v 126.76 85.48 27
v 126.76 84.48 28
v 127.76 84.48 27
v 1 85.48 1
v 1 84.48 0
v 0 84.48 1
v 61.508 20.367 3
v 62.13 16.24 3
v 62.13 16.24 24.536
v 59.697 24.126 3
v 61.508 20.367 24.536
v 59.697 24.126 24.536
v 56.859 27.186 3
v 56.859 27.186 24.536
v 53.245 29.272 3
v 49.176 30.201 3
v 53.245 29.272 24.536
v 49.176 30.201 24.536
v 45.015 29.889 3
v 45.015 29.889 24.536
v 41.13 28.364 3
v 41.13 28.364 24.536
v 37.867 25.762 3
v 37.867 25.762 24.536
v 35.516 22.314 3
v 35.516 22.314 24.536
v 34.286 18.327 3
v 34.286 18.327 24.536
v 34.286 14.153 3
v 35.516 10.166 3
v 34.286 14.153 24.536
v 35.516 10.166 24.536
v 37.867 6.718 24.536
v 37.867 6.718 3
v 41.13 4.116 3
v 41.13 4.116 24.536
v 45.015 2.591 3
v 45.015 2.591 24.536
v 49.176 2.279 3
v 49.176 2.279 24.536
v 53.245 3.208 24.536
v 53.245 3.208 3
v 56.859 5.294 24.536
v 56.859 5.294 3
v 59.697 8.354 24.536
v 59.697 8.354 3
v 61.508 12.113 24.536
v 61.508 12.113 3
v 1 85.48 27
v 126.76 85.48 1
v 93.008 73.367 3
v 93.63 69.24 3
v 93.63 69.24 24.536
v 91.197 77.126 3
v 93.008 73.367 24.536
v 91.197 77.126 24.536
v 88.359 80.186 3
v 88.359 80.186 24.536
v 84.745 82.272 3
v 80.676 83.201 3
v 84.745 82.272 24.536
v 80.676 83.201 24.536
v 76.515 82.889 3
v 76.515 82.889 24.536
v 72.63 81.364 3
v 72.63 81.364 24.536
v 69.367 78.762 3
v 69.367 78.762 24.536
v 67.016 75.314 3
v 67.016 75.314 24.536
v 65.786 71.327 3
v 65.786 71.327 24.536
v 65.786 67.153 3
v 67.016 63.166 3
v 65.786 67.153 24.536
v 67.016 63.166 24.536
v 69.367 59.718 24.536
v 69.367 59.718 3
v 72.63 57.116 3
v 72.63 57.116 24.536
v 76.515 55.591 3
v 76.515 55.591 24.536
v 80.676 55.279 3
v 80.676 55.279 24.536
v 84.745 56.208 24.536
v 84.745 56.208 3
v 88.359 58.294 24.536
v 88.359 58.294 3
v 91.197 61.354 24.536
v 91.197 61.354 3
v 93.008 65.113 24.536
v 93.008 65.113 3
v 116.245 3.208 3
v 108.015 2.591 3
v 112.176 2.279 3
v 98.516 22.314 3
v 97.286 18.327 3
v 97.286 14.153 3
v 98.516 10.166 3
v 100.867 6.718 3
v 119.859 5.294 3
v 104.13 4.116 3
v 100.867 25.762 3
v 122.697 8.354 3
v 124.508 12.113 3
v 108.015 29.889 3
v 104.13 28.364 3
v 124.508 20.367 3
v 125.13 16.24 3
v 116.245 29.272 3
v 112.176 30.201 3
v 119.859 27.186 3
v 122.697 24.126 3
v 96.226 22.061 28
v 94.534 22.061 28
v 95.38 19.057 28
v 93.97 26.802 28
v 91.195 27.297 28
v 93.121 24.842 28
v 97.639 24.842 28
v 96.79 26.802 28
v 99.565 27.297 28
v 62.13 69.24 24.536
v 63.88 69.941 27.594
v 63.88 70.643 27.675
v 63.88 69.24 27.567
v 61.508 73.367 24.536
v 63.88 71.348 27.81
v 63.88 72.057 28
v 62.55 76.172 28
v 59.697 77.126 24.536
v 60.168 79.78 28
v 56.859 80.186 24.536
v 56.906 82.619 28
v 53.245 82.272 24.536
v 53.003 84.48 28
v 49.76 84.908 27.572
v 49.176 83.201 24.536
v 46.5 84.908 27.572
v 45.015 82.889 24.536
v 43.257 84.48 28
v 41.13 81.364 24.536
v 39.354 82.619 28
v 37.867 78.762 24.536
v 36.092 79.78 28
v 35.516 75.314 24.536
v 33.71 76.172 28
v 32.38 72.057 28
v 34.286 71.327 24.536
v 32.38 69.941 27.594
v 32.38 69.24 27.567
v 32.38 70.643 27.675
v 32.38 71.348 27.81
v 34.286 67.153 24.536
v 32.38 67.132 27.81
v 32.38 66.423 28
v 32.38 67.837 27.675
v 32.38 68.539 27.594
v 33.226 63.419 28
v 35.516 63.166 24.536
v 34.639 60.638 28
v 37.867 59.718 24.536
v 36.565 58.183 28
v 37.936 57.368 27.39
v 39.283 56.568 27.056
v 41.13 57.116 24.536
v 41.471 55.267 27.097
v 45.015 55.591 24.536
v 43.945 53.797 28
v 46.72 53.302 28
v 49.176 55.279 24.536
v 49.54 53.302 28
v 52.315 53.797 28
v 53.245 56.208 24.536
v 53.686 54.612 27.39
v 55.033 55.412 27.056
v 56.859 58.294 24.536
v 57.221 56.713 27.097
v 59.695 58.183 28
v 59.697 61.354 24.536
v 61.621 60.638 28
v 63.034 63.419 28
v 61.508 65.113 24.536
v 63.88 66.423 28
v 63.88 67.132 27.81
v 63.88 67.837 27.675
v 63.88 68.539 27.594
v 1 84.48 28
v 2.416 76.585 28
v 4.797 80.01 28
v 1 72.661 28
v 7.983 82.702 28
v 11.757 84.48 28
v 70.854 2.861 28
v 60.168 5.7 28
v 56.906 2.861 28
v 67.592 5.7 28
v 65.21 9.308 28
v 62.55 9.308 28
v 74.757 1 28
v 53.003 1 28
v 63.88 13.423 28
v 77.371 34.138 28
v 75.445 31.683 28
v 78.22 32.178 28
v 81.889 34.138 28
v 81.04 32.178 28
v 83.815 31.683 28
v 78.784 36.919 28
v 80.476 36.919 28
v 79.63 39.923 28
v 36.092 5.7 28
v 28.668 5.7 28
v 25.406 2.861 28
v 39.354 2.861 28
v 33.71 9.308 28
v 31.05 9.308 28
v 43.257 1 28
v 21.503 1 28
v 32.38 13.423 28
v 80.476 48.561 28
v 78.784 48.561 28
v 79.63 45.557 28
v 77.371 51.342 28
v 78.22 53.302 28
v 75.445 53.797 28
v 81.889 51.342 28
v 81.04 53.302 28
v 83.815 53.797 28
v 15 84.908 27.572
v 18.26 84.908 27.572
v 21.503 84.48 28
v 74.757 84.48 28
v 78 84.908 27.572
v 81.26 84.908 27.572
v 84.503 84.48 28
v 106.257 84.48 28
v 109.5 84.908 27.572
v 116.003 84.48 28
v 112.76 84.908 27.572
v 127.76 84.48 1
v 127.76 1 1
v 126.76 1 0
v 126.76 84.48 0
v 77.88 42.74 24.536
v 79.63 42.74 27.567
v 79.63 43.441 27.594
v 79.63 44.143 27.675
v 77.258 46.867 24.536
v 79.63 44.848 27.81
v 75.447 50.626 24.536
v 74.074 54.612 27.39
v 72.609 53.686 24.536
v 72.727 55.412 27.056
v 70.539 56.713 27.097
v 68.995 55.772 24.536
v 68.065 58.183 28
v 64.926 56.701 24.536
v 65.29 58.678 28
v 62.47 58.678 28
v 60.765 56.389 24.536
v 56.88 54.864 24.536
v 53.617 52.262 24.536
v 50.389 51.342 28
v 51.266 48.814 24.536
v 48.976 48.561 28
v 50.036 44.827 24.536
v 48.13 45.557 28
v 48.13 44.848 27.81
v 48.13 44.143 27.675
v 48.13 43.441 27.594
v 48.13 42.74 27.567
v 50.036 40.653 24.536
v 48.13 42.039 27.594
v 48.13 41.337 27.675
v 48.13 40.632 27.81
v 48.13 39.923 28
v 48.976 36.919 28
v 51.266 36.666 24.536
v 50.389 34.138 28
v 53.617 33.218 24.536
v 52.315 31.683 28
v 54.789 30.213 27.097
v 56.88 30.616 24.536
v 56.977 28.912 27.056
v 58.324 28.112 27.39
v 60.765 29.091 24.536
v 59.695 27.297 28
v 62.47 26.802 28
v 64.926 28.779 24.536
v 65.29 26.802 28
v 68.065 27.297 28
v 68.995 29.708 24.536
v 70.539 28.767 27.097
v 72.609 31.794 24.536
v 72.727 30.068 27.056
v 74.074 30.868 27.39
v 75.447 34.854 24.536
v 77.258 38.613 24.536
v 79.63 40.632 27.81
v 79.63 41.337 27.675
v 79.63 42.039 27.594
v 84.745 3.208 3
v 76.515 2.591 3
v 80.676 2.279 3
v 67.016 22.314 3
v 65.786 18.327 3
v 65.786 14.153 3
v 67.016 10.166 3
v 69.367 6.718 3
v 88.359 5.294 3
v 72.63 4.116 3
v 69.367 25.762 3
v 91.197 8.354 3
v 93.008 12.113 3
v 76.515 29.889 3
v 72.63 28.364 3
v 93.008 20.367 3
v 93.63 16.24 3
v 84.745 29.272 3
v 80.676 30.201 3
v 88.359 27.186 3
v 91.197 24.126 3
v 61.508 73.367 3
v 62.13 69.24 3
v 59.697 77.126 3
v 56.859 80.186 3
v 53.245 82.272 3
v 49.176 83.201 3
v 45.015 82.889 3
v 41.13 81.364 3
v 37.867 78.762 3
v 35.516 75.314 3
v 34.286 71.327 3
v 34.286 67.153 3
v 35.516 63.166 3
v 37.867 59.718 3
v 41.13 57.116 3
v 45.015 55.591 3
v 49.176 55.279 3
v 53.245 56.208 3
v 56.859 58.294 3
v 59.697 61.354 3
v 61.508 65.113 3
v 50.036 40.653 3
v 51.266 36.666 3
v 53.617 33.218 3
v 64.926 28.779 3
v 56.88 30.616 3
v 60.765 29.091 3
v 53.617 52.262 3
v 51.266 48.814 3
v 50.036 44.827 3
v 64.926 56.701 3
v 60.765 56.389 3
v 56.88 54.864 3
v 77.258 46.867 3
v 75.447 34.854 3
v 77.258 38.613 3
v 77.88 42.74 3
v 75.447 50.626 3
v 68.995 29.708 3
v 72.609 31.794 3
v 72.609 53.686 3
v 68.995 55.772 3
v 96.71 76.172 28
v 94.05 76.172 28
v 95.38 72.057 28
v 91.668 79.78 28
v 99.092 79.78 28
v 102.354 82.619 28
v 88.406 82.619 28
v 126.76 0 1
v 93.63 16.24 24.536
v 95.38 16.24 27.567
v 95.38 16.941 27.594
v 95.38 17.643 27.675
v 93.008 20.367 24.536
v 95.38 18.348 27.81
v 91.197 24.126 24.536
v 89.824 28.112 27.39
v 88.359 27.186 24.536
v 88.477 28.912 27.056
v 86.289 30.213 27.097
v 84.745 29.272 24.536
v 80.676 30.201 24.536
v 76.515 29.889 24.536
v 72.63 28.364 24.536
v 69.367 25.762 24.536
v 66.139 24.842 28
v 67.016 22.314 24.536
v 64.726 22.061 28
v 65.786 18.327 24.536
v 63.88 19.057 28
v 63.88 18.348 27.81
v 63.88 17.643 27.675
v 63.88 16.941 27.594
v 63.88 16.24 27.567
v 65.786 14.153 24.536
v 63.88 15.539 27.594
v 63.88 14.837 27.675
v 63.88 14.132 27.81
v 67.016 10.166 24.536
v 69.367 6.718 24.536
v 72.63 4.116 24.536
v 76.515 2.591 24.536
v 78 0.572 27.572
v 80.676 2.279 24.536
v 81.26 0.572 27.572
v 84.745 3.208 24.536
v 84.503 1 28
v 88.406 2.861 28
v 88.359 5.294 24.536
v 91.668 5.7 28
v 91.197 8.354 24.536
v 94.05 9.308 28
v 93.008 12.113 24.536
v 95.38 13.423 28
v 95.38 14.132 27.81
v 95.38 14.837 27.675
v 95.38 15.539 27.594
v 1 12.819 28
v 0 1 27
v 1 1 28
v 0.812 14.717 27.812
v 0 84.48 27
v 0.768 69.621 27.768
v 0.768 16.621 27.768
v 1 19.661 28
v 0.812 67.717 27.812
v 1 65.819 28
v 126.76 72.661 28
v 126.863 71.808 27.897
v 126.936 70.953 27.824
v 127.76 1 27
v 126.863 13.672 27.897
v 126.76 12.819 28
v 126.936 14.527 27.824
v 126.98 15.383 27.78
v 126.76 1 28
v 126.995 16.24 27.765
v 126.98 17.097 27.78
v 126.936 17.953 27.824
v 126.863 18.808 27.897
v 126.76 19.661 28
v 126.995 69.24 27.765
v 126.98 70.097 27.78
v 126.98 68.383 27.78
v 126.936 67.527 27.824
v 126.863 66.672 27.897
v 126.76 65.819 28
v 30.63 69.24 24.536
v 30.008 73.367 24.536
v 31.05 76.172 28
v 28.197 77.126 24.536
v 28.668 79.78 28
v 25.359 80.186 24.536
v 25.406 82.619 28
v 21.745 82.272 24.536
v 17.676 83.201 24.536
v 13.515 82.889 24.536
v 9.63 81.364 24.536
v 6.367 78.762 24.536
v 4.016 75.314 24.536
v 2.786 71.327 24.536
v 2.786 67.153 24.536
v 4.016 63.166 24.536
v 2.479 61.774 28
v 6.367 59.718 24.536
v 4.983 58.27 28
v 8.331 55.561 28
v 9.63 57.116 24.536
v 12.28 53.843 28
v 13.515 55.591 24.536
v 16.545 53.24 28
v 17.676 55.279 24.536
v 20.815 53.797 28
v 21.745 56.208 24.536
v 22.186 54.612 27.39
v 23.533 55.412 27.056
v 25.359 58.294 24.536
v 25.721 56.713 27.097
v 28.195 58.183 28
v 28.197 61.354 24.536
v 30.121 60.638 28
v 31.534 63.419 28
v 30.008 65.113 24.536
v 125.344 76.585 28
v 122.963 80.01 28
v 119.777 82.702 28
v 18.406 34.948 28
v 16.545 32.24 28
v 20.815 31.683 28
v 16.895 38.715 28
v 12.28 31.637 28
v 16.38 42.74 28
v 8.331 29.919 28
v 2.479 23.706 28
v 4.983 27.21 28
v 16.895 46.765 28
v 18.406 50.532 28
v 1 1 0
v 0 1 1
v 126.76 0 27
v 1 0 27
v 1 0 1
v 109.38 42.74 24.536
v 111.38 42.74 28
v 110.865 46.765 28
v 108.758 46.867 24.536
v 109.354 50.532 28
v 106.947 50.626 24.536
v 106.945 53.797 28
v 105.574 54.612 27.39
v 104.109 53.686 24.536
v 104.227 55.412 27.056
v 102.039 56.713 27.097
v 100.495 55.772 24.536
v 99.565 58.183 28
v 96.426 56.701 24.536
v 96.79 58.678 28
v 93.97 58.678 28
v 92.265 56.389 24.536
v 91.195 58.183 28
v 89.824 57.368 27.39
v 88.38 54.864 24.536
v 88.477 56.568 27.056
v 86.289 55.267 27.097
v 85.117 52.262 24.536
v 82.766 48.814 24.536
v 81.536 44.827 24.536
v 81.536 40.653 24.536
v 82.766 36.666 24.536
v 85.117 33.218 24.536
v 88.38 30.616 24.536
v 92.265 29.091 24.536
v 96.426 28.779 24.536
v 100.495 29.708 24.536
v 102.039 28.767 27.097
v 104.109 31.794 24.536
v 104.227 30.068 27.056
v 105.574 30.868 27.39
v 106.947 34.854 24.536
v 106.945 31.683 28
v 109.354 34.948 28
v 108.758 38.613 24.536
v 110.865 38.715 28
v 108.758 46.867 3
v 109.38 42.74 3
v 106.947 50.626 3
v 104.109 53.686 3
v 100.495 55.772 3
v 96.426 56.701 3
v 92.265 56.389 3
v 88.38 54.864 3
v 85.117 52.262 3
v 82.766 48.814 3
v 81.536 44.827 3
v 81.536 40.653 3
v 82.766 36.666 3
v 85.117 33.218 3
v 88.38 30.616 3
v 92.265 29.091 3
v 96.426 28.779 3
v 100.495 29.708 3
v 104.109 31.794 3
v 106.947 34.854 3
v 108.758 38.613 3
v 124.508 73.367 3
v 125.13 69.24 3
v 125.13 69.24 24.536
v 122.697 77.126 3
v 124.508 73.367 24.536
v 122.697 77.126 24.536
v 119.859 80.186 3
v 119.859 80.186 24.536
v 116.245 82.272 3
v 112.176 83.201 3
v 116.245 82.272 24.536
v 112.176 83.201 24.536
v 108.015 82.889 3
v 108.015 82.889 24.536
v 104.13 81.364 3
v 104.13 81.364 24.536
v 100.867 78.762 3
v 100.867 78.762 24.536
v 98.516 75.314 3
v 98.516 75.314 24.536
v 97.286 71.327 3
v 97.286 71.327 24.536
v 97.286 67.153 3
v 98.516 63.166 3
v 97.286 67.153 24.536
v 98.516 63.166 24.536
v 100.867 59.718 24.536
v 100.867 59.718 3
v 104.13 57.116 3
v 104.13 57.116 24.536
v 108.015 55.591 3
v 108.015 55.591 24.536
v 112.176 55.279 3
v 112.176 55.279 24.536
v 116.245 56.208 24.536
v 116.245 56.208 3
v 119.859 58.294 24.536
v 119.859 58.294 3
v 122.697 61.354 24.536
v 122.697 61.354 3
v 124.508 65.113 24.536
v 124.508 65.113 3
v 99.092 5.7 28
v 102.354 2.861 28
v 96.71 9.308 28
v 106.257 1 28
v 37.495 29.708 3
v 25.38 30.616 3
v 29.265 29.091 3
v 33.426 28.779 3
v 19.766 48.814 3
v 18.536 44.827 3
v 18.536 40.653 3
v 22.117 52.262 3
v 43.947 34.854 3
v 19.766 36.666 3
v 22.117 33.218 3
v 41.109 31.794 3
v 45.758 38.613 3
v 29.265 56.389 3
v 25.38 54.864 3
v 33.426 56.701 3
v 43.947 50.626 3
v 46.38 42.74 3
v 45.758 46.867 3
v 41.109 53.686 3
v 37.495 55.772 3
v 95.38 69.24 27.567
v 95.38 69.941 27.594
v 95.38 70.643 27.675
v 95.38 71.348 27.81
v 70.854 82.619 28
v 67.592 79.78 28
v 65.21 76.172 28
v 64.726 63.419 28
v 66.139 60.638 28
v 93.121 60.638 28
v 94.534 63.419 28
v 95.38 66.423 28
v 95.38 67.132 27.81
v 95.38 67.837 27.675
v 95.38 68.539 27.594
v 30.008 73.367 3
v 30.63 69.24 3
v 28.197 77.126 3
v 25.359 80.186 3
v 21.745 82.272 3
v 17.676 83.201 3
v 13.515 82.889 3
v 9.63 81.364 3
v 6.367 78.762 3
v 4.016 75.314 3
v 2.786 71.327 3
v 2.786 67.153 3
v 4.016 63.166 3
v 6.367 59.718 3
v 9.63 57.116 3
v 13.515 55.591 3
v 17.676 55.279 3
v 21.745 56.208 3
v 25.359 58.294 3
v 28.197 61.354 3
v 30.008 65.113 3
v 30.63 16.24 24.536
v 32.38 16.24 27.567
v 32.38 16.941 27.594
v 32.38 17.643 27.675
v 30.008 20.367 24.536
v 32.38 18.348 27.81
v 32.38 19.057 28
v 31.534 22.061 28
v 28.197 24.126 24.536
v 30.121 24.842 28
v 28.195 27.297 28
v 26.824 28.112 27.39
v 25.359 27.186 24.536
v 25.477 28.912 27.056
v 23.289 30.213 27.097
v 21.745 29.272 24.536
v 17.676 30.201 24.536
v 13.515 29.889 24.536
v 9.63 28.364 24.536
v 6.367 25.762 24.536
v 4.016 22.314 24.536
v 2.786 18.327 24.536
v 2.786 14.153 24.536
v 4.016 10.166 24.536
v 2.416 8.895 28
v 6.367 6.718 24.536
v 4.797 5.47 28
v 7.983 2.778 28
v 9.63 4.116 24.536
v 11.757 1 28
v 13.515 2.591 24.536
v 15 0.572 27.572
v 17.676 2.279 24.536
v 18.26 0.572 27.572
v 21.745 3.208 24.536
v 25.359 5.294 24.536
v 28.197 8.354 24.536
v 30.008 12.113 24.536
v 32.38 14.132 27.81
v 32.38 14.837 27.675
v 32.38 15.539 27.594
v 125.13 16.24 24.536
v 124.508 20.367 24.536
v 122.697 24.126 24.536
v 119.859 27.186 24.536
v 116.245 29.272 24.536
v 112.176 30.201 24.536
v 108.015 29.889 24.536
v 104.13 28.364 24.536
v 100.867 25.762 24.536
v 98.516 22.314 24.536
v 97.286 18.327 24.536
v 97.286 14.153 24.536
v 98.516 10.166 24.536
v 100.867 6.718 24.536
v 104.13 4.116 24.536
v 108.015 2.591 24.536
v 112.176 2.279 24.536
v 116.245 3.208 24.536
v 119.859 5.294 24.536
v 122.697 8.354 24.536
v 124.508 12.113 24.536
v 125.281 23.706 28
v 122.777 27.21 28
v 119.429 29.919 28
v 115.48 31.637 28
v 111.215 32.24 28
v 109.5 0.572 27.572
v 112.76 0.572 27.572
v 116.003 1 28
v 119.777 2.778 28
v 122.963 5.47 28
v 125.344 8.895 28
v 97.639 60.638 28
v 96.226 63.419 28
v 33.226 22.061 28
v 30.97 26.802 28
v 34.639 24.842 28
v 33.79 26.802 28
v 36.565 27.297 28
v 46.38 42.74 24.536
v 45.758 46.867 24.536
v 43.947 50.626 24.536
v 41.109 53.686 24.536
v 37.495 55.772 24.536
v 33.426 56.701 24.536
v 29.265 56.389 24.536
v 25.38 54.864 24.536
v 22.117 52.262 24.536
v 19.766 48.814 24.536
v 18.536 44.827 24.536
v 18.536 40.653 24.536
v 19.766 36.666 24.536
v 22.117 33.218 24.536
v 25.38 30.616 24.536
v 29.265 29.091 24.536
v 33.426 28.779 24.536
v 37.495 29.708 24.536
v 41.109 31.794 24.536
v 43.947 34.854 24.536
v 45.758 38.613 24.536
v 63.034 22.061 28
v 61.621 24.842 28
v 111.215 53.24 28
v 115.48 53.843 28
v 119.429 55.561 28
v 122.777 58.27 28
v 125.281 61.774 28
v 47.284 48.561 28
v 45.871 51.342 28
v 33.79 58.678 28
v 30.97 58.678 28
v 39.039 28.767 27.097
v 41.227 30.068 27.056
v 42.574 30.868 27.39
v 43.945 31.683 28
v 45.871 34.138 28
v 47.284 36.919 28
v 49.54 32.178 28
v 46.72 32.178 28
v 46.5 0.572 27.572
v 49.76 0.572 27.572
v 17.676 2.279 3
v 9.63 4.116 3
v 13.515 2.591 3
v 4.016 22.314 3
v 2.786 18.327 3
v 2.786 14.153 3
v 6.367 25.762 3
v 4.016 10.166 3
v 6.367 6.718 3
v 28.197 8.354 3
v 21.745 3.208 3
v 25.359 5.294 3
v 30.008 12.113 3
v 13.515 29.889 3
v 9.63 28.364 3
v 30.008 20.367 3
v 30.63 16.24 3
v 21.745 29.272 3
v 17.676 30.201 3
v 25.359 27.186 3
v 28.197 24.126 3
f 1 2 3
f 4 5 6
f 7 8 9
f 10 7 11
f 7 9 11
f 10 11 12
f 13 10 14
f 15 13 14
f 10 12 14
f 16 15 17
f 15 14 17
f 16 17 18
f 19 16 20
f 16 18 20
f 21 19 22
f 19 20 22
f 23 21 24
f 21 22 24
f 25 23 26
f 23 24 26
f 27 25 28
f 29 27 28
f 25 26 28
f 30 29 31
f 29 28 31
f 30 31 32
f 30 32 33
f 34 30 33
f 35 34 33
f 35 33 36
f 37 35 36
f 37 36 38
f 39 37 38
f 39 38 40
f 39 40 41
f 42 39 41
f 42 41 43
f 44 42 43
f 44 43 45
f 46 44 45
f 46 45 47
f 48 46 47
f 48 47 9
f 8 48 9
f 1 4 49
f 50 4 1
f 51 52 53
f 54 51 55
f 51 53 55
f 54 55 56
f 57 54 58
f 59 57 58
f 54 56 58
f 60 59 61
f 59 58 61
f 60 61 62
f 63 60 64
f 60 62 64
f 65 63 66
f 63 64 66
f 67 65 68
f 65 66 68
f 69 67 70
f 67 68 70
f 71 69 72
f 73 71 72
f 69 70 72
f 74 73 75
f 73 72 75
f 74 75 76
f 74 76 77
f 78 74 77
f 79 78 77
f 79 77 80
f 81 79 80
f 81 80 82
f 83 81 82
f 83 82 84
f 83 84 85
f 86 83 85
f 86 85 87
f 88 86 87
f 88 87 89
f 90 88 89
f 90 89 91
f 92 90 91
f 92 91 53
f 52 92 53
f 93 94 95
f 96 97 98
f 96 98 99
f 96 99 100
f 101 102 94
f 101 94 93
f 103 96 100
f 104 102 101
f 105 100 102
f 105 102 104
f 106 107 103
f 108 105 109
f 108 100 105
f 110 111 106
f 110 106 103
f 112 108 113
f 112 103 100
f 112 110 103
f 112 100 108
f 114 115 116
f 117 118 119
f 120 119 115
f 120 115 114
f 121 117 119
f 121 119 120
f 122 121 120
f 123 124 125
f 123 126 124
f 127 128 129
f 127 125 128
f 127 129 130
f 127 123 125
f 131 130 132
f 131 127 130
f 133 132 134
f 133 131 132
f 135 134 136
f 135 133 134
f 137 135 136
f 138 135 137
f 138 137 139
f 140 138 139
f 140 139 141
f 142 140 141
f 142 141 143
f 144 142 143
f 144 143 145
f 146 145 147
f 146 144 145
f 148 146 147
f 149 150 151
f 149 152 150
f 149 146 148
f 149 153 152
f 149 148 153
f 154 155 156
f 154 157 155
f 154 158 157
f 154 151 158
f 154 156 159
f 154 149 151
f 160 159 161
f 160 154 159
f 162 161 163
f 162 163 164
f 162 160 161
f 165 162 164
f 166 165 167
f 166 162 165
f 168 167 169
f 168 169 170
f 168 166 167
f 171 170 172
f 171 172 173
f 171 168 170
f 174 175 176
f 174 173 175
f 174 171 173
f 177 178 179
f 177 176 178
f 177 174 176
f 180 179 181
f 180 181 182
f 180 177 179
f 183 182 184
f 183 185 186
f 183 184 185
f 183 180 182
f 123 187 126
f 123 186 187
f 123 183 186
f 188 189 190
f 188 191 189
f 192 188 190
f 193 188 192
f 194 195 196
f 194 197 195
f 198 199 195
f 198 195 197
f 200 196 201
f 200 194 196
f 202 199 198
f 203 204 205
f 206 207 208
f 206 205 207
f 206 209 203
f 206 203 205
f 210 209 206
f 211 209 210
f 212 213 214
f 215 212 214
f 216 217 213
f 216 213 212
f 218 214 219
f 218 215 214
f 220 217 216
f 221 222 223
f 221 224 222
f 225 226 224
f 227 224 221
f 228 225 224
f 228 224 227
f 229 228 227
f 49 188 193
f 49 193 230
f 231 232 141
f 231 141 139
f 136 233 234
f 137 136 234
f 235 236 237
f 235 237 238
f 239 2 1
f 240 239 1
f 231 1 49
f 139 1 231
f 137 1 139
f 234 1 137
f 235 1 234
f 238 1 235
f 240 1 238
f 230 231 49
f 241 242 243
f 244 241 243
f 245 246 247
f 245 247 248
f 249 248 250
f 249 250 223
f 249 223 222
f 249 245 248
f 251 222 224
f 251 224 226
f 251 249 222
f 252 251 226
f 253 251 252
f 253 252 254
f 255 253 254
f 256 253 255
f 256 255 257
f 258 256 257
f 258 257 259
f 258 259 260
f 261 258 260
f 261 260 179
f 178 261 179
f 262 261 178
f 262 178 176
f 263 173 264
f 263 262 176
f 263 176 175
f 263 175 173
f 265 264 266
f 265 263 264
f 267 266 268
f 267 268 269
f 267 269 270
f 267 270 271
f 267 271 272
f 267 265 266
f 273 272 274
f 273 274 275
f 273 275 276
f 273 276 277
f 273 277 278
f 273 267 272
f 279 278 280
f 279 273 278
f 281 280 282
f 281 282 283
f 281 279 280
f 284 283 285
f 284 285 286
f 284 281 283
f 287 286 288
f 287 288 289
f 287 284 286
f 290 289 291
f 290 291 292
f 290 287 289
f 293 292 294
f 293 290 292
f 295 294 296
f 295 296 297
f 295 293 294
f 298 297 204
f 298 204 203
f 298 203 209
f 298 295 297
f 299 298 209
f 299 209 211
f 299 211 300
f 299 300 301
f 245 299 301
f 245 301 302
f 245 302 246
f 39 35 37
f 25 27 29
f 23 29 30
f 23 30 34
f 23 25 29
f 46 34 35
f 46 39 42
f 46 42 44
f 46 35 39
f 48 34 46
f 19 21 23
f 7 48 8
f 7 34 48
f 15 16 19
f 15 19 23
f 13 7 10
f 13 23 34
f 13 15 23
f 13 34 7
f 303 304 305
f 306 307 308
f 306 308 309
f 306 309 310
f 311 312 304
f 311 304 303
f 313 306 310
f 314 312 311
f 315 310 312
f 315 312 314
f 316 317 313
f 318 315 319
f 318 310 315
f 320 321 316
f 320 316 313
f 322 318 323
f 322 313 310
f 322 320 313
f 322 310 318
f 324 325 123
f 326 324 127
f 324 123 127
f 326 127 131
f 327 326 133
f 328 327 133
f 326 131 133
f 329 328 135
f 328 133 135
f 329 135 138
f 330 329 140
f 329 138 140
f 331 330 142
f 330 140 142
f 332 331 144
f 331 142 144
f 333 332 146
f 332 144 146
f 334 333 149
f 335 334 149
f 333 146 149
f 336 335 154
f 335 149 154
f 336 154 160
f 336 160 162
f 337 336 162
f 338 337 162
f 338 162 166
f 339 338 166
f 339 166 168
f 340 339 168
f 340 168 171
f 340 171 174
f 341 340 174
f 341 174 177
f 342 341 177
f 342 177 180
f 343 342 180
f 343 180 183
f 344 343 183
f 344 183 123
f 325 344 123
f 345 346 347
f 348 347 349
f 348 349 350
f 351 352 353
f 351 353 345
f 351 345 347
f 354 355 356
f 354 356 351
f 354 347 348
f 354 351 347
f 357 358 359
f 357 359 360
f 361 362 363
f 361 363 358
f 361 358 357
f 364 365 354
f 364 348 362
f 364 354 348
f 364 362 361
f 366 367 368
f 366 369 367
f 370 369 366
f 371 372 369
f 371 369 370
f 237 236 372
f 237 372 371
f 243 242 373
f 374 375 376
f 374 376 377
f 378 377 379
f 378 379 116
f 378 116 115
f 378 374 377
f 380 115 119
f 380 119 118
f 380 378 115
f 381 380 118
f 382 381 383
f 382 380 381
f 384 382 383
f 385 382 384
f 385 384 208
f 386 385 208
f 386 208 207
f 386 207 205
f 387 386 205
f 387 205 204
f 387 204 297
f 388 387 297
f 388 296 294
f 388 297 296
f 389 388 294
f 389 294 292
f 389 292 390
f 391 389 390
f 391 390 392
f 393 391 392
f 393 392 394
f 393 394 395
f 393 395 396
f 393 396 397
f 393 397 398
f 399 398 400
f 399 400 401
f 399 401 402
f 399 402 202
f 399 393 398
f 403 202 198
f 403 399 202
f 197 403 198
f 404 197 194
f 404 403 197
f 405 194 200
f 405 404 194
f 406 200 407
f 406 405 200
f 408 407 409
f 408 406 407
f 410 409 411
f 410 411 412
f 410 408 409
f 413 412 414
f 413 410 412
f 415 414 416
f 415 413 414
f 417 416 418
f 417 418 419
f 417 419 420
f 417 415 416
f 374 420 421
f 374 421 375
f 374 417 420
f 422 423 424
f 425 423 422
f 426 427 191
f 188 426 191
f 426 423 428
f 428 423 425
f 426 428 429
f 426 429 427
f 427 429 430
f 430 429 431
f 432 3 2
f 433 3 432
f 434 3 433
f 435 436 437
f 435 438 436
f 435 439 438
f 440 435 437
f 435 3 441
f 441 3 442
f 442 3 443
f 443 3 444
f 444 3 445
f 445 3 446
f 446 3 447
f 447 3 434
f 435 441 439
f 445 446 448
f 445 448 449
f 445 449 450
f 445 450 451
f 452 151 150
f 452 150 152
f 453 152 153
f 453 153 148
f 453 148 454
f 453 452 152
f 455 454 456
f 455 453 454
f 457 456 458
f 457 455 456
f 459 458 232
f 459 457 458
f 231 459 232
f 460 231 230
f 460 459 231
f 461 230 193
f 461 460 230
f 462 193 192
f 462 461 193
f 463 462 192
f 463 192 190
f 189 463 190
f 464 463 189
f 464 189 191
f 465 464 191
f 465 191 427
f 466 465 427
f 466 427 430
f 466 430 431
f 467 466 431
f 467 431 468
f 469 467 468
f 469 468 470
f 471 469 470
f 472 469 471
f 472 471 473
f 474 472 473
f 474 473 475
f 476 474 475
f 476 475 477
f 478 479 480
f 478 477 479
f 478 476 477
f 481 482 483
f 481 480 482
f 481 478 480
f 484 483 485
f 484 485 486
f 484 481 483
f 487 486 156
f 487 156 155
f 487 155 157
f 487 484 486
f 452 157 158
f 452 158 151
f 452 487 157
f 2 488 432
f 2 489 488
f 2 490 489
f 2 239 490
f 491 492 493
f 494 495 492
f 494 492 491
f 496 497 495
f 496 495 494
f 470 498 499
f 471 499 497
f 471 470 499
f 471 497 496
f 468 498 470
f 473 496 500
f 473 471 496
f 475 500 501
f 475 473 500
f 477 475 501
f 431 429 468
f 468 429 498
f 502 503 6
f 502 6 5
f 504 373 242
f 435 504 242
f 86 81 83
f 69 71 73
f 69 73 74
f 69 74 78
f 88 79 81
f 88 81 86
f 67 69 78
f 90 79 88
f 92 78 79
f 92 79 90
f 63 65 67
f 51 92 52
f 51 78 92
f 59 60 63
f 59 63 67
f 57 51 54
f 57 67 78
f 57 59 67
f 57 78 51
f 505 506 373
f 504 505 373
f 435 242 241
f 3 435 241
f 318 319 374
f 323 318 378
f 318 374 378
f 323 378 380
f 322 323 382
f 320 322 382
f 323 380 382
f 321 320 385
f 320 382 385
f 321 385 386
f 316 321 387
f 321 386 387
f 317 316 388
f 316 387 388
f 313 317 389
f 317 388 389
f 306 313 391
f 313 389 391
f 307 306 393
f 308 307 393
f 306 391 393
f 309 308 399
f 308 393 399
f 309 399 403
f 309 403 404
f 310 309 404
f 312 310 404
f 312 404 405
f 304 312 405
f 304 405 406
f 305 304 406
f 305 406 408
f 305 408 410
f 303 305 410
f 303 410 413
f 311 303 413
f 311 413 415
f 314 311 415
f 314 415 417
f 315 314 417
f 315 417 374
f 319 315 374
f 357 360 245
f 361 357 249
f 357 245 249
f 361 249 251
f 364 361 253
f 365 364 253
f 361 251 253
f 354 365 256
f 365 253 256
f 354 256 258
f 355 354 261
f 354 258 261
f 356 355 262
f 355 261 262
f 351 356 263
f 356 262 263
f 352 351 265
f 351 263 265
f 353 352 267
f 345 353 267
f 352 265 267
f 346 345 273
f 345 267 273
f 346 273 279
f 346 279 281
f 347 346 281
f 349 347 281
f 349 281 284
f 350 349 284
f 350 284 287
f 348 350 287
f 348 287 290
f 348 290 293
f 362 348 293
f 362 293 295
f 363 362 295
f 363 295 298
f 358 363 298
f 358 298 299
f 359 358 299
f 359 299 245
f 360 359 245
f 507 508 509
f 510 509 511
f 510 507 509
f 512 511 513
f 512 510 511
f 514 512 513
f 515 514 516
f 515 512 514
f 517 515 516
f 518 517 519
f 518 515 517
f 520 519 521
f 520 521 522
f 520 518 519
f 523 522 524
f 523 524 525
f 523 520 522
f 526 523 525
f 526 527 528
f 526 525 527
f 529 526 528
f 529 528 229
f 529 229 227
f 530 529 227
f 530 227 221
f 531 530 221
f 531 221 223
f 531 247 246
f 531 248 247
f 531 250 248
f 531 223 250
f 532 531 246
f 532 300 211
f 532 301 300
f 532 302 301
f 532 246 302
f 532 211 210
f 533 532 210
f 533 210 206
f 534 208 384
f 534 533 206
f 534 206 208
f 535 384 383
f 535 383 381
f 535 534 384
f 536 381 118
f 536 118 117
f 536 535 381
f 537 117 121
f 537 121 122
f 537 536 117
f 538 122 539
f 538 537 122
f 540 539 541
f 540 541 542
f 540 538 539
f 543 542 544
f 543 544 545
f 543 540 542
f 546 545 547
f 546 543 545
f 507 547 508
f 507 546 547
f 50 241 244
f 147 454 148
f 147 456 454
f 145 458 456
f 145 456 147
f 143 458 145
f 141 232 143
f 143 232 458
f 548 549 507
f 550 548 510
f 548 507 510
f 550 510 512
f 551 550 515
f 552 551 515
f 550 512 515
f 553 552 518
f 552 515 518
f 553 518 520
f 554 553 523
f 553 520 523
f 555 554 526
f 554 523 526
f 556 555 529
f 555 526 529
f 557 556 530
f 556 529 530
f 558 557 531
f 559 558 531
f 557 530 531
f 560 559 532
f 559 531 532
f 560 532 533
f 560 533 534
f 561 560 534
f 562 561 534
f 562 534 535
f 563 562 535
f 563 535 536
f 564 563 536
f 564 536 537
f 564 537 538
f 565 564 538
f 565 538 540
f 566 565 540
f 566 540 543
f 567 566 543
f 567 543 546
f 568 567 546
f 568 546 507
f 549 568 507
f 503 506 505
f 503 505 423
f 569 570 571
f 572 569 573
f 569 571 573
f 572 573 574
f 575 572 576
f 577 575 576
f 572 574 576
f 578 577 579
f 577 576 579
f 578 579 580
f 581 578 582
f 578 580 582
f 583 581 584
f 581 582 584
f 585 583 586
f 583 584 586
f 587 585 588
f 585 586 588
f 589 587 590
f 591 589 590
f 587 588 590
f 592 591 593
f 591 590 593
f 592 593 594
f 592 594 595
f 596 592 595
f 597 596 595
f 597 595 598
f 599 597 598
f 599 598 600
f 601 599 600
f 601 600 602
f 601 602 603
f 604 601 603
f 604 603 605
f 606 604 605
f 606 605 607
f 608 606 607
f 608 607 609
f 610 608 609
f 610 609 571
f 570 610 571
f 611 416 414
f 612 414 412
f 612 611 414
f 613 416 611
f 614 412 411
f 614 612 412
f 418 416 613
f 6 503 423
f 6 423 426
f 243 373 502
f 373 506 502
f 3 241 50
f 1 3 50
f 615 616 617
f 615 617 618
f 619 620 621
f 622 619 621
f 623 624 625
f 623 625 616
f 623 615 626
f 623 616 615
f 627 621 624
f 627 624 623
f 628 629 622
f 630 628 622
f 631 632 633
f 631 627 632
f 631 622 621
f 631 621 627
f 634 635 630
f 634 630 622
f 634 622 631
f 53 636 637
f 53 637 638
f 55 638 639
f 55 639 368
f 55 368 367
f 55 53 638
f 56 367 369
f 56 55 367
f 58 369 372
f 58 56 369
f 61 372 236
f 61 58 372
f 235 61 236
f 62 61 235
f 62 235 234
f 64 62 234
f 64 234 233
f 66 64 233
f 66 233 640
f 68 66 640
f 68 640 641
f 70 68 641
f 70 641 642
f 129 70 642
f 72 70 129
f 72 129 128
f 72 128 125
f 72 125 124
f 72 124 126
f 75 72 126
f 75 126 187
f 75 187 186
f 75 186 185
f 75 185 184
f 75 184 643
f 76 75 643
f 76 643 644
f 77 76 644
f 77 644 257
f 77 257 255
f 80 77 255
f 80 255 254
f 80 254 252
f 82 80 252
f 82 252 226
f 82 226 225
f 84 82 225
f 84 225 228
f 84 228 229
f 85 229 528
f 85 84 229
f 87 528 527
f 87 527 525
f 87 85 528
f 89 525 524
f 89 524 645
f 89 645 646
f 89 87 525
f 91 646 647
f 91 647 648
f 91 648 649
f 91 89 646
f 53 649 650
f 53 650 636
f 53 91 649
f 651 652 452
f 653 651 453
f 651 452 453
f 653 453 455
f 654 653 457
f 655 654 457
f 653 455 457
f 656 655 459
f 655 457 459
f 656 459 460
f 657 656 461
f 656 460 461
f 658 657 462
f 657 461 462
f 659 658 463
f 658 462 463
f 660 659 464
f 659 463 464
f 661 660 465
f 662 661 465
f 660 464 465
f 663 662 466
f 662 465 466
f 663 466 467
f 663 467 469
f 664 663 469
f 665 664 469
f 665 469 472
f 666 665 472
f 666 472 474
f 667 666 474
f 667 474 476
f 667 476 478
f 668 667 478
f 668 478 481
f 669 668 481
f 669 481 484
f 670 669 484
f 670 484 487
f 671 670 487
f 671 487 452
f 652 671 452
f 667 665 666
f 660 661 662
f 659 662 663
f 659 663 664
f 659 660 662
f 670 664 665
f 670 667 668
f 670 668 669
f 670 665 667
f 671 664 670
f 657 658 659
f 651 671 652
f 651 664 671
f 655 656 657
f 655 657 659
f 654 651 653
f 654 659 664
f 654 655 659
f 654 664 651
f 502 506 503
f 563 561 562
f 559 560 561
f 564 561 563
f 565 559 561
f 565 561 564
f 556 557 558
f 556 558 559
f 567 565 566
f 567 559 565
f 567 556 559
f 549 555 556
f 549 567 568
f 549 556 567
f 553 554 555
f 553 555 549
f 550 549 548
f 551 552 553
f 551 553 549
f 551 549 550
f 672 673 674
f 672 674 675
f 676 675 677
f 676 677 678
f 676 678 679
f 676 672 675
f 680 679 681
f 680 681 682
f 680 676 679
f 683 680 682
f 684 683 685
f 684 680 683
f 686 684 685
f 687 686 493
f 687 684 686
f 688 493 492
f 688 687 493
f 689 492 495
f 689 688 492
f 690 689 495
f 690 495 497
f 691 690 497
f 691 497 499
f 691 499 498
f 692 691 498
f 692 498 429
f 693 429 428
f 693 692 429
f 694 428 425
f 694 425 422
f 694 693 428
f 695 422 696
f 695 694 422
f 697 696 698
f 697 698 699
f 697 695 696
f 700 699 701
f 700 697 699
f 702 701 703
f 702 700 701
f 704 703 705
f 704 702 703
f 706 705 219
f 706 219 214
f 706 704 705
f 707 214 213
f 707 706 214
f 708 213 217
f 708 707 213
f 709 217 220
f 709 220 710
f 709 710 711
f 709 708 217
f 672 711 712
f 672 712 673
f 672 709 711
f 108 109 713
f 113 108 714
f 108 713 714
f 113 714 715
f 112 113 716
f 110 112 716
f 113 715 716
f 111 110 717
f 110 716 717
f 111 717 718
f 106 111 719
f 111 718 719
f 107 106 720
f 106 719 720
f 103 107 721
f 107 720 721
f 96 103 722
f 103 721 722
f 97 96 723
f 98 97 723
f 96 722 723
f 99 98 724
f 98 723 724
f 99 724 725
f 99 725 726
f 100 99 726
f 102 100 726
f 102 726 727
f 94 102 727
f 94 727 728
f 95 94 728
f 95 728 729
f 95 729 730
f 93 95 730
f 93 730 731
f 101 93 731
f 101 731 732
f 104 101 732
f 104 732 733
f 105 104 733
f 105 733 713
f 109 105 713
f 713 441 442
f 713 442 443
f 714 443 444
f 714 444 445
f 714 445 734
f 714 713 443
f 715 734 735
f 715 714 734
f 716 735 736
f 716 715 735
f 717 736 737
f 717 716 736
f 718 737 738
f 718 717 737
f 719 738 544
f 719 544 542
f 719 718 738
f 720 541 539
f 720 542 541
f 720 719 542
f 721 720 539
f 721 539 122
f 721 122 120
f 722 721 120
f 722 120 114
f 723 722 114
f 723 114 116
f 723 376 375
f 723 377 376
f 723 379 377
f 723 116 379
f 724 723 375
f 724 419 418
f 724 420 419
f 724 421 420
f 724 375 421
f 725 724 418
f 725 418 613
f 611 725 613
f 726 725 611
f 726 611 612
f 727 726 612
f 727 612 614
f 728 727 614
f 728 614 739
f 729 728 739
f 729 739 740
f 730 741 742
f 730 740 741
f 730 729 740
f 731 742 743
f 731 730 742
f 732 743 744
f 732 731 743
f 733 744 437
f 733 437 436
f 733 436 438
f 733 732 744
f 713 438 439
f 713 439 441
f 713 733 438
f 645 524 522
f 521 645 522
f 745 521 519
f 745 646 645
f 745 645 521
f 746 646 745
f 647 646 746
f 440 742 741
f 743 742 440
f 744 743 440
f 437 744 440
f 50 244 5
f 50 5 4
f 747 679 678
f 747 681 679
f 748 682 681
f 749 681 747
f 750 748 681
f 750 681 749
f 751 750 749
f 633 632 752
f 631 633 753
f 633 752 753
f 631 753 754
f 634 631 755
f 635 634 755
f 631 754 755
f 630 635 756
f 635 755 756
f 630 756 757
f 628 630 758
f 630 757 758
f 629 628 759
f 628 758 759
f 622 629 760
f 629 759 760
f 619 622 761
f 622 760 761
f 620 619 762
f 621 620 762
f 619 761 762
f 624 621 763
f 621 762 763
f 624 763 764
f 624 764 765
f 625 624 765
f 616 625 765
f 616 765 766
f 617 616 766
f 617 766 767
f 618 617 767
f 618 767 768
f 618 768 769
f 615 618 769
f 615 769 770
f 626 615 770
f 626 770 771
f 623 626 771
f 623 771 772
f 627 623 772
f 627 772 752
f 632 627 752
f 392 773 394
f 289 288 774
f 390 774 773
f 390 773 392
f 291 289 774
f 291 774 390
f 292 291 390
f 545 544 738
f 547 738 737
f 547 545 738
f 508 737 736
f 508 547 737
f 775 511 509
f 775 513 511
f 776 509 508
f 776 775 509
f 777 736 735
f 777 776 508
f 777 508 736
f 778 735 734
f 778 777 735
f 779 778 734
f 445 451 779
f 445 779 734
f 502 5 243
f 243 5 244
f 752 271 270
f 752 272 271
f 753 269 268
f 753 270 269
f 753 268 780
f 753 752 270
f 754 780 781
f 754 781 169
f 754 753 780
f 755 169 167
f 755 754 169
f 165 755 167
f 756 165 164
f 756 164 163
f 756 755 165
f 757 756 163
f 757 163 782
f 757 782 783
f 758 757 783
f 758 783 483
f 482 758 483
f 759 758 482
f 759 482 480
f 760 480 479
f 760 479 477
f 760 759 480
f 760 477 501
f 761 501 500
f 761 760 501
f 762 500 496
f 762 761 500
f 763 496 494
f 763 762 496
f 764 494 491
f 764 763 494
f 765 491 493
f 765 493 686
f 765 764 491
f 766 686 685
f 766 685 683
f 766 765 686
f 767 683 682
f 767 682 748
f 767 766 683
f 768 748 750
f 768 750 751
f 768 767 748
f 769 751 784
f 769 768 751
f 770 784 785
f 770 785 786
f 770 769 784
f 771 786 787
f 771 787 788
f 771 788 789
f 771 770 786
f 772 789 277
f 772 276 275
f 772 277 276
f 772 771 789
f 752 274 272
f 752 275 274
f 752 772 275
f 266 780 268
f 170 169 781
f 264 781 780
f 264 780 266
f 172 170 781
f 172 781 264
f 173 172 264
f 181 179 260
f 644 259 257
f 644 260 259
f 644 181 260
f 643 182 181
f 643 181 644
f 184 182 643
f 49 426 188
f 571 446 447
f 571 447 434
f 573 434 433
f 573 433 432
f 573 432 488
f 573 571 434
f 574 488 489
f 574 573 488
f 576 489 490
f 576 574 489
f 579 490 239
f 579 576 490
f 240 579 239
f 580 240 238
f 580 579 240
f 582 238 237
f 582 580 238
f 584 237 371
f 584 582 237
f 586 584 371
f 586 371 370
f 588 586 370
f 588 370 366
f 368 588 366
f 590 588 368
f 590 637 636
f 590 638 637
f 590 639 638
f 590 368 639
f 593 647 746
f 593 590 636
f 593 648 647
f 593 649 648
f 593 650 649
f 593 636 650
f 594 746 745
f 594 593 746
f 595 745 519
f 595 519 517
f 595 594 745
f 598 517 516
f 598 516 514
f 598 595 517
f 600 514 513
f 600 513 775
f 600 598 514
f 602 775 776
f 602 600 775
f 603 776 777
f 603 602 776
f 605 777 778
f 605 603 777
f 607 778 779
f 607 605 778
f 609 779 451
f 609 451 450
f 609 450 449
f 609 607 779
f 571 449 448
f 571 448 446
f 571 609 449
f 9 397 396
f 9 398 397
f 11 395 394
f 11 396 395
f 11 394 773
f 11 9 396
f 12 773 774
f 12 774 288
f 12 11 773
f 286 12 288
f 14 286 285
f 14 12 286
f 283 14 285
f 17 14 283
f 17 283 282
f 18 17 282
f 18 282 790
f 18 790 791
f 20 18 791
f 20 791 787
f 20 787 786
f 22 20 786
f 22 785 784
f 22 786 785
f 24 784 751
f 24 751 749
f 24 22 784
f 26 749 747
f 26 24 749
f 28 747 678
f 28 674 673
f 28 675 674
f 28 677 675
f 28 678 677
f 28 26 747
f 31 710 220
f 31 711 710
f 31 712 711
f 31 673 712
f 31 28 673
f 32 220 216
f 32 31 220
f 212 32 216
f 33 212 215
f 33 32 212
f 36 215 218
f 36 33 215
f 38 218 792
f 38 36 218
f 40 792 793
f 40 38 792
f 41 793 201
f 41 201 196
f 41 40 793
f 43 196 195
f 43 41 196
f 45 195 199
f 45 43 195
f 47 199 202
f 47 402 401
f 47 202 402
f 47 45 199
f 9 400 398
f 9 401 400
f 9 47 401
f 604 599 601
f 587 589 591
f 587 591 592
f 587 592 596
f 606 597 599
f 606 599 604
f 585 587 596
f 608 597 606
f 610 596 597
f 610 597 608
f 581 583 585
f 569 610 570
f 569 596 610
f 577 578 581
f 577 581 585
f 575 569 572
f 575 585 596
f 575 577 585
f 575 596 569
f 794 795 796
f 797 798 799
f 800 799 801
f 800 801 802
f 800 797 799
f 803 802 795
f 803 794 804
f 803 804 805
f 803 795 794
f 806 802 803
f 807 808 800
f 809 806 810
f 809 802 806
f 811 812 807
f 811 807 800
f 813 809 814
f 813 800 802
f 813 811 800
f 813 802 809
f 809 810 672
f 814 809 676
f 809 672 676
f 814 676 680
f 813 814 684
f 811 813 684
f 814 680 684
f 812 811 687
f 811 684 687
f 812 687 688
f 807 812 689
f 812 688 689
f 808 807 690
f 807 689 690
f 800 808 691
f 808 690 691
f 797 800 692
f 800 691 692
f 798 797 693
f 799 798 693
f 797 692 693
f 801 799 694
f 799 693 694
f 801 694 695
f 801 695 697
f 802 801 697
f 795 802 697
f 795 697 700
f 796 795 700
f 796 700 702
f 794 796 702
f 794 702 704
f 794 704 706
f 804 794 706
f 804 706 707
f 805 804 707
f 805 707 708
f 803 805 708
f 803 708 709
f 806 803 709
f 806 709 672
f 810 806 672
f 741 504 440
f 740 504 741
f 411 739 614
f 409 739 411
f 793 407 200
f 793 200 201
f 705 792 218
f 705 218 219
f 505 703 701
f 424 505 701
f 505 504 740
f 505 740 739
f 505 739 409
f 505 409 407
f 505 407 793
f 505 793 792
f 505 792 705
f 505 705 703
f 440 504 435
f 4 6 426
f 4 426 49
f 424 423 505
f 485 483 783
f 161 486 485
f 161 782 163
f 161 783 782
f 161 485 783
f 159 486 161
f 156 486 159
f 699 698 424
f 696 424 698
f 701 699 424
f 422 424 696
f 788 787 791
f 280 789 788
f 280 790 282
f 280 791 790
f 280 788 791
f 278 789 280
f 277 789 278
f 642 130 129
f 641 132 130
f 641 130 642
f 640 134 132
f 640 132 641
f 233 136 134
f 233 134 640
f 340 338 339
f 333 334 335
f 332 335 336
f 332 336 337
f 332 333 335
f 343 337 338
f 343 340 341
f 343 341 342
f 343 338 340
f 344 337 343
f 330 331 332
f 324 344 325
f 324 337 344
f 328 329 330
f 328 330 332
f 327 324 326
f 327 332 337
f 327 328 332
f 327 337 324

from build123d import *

# Parameters (mm, degrees)
ESQUISSE1_W             = 127.76
ESQUISSE1_H             = 85.48
BOSS_EXTRU_1_DEPTH      = 28
ESQUISSE2_R             = 14
ENL_V_MAT_EXTRU_1_DEPTH = 25
CHANFREIN1_SIZE         = 2
CHANFREIN1_SIZE_2       = 3.464101615


with BuildPart() as part:
    # Esquisse1 → Boss.-Extru.1 (new body)
    with BuildSketch(Plane.XY):
        with Locations((63.88, 42.74)):
            Rectangle(ESQUISSE1_W, ESQUISSE1_H)
    extrude(amount=BOSS_EXTRU_1_DEPTH)

    # Esquisse2 → Enlèv. mat.-Extru.1 (cut)
    with BuildSketch(Plane.XY.offset(28)):
        with Locations((111.13, 69.24)):
            Circle(ESQUISSE2_R)
        with Locations((79.63, 69.24)):
            Circle(ESQUISSE2_R)
        with Locations((48.13, 69.24)):
            Circle(ESQUISSE2_R)
        with Locations((16.63, 69.24)):
            Circle(ESQUISSE2_R)
        with Locations((32.38, 42.74)):
            Circle(ESQUISSE2_R)
        with Locations((16.63, 16.24)):
            Circle(ESQUISSE2_R)
        with Locations((48.13, 16.24)):
            Circle(ESQUISSE2_R)
        with Locations((111.13, 16.24)):
            Circle(ESQUISSE2_R)
        with Locations((79.63, 16.24)):
            Circle(ESQUISSE2_R)
        with Locations((63.88, 42.74)):
            Circle(ESQUISSE2_R)
        with Locations((95.38, 42.74)):
            Circle(ESQUISSE2_R)
    extrude(amount=-ENL_V_MAT_EXTRU_1_DEPTH, mode=Mode.SUBTRACT)

    # Chanfrein1
    # the kernel refuses this chamfer: 3.464101615, 2 mm, written as the material it takes off along each edge
    with BuildSketch(Plane(origin=(79.63, 69.24, 28), x_dir=(1, 0, 0), z_dir=(0, -1, 0))) as chanfrein1_piece_1:
        Polygon((14 + CHANFREIN1_SIZE, 0), (14, -CHANFREIN1_SIZE_2), (14, 0), align=None)
    revolve(axis=Axis((79.63, 69.24, 28), (0, 0, 1)), mode=Mode.SUBTRACT)
    with BuildSketch(Plane(origin=(111.13, 69.24, 28), x_dir=(1, 0, 0), z_dir=(0, -1, 0))) as chanfrein1_piece_2:
        Polygon((14 + CHANFREIN1_SIZE, 0), (14, -CHANFREIN1_SIZE_2), (14, 0), align=None)
    revolve(axis=Axis((111.13, 69.24, 28), (0, 0, 1)), mode=Mode.SUBTRACT)
    with BuildSketch(Plane(origin=(63.88, 42.74, 28), x_dir=(1, 0, 0), z_dir=(0, -1, 0))) as chanfrein1_piece_3:
        Polygon((14 + CHANFREIN1_SIZE, 0), (14, -CHANFREIN1_SIZE_2), (14, 0), align=None)
    revolve(axis=Axis((63.88, 42.74, 28), (0, 0, 1)), mode=Mode.SUBTRACT)
    with BuildSketch(Plane(origin=(95.38, 42.74, 28), x_dir=(1, 0, 0), z_dir=(0, -1, 0))) as chanfrein1_piece_4:
        Polygon((14 + CHANFREIN1_SIZE, 0), (14, -CHANFREIN1_SIZE_2), (14, 0), align=None)
    revolve(axis=Axis((95.38, 42.74, 28), (0, 0, 1)), mode=Mode.SUBTRACT)
    with BuildSketch(Plane(origin=(32.38, 42.74, 28), x_dir=(1, 0, 0), z_dir=(0, -1, 0))) as chanfrein1_piece_5:
        Polygon((14 + CHANFREIN1_SIZE, 0), (14, -CHANFREIN1_SIZE_2), (14, 0), align=None)
    revolve(axis=Axis((32.38, 42.74, 28), (0, 0, 1)), mode=Mode.SUBTRACT)
    with BuildSketch(Plane(origin=(16.63, 16.24, 28), x_dir=(1, 0, 0), z_dir=(0, -1, 0))) as chanfrein1_piece_6:
        Polygon((14 + CHANFREIN1_SIZE, 0), (14, -CHANFREIN1_SIZE_2), (14, 0), align=None)
    revolve(axis=Axis((16.63, 16.24, 28), (0, 0, 1)), mode=Mode.SUBTRACT)
    with BuildSketch(Plane(origin=(16.63, 69.24, 28), x_dir=(1, 0, 0), z_dir=(0, -1, 0))) as chanfrein1_piece_7:
        Polygon((14 + CHANFREIN1_SIZE, 0), (14, -CHANFREIN1_SIZE_2), (14, 0), align=None)
    revolve(axis=Axis((16.63, 69.24, 28), (0, 0, 1)), mode=Mode.SUBTRACT)
    with BuildSketch(Plane(origin=(48.13, 69.24, 28), x_dir=(1, 0, 0), z_dir=(0, -1, 0))) as chanfrein1_piece_8:
        Polygon((14 + CHANFREIN1_SIZE, 0), (14, -CHANFREIN1_SIZE_2), (14, 0), align=None)
    revolve(axis=Axis((48.13, 69.24, 28), (0, 0, 1)), mode=Mode.SUBTRACT)
    with BuildSketch(Plane(origin=(79.63, 16.24, 28), x_dir=(1, 0, 0), z_dir=(0, -1, 0))) as chanfrein1_piece_9:
        Polygon((14 + CHANFREIN1_SIZE, 0), (14, -CHANFREIN1_SIZE_2), (14, 0), align=None)
    revolve(axis=Axis((79.63, 16.24, 28), (0, 0, 1)), mode=Mode.SUBTRACT)
    with BuildSketch(Plane(origin=(111.13, 16.24, 28), x_dir=(1, 0, 0), z_dir=(0, -1, 0))) as chanfrein1_piece_10:
        Polygon((14 + CHANFREIN1_SIZE, 0), (14, -CHANFREIN1_SIZE_2), (14, 0), align=None)
    revolve(axis=Axis((111.13, 16.24, 28), (0, 0, 1)), mode=Mode.SUBTRACT)
    with BuildSketch(Plane(origin=(48.13, 16.24, 28), x_dir=(1, 0, 0), z_dir=(0, -1, 0))) as chanfrein1_piece_11:
        Polygon((14 + CHANFREIN1_SIZE, 0), (14, -CHANFREIN1_SIZE_2), (14, 0), align=None)
    revolve(axis=Axis((48.13, 16.24, 28), (0, 0, 1)), mode=Mode.SUBTRACT)

    # Chanfrein2
    # the kernel refuses this chamfer: 1 mm, written as the material it takes off along each edge
    with BuildSketch(Plane(origin=(127.093333333, 0.666666667, 27.333333333), x_dir=(0.7071067811865476, 0.7071067811865474, 0), z_dir=(0.5773502691896257, -0.5773502691896258, 0.5773502691896258)), Plane(origin=(0.666666667, 84.813333333, 27.333333333), x_dir=(0.7071067811865475, 0, 0.7071067811865476), z_dir=(-0.5773502691896258, 0.5773502691896256, 0.5773502691896257)), Plane(origin=(127.093333333, 84.813333333, 0.666666667), x_dir=(-0.7071067811865476, 0, -0.7071067811865474), z_dir=(0.5773502691896257, 0.5773502691896257, -0.5773502691896258)), Plane(origin=(0.666666667, 0.666666667, 0.666666667), x_dir=(-0.7071067811865475, 0.7071067811865475, 0), z_dir=(-0.5773502691896257, -0.5773502691896257, -0.5773502691896257))) as chanfrein2_piece_1:
        Polygon((-0.707106781, -0.40824829), (0.707106781, -0.40824829), (0, 0.816496581), align=None)
    extrude(amount=1.270170592, mode=Mode.SUBTRACT)
    with BuildSketch(Plane(origin=(127.093333333, 84.813333333, 27.333333333), x_dir=(-0.7071067811865475, 0, 0.7071067811865475), z_dir=(0.5773502691896258, 0.5773502691896258, 0.5773502691896258)), Plane(origin=(0.666666667, 0.666666667, 27.333333333), x_dir=(-0.7071067811865475, 0.7071067811865475, 0), z_dir=(-0.5773502691896258, -0.5773502691896258, 0.5773502691896257)), Plane(origin=(0.666666667, 84.813333333, 0.666666667), x_dir=(0.7071067811865475, 0, -0.7071067811865475), z_dir=(-0.5773502691896258, 0.5773502691896256, -0.5773502691896258)), Plane(origin=(127.093333333, 0.666666667, 0.666666667), x_dir=(0.7071067811865476, 0.7071067811865475, 0), z_dir=(0.5773502691896256, -0.5773502691896258, -0.577350269189626))) as chanfrein2_piece_2:
        Polygon((-0.707106781, 0.40824829), (0.707106781, 0.40824829), (0, -0.816496581), align=None)
    extrude(amount=1.270170592, mode=Mode.SUBTRACT)
    with BuildSketch(Plane(origin=(127.76, -2.571682988, 28), x_dir=(0.0274958766105822, 0, -0.999621916911297), z_dir=(0, 1, 0)), Plane(origin=(0, 88.051682988, 28), x_dir=(-0.02749587661058639, 0, -0.9996219169112968), z_dir=(0, -1, 0))) as chanfrein2_piece_3:
        with BuildLine():
            Line((1.028673195, 0), (-0.056547155, 1.027117794))
            Line((-0.056547155, 1.027117794), (-0.076539593, 1.026567876))
            ThreePointArc((-0.076539593, 1.026567876), (-0.034129227, 0.51339783), (-0.019992438, -0.000549918))
            Line((-0.019992438, -0.000549918), (0.000549918, -0.019992438))
            ThreePointArc((0.000549918, -0.019992438), (0.514497665, -0.00585565), (1.029223113, -0.019992438))
            Line((1.029223113, -0.019992438), (1.028673195, 0))
        make_face()
    extrude(amount=90.623365976, mode=Mode.SUBTRACT)
    with BuildSketch(Plane(origin=(130.331682988, 85.48, 28), x_dir=(0, -0.9996219169112968, 0.02749587661058574), z_dir=(-1, 0, 0)), Plane(origin=(-2.571682988, 0, 0), x_dir=(0, -0.027495876610586372, 0.9996219169112968), z_dir=(1, 0, 0))) as chanfrein2_piece_4:
        with BuildLine():
            Line((1.028673195, 0), (-0.056547155, -1.027117794))
            Line((-0.056547155, -1.027117794), (-0.076539593, -1.026567876))
            ThreePointArc((-0.076539593, -1.026567876), (-0.034129227, -0.51339783), (-0.019992438, 0.000549918))
            Line((-0.019992438, 0.000549918), (0.000549918, 0.019992438))
            ThreePointArc((0.000549918, 0.019992438), (0.514497665, 0.00585565), (1.029223113, 0.019992438))
            Line((1.029223113, 0.019992438), (1.028673195, 0))
        make_face()
    extrude(amount=132.903365976, mode=Mode.SUBTRACT)
    with BuildSketch(Plane(origin=(130.331682988, 85.48, 0), x_dir=(0, -0.9996219169112968, -0.027495876610586483), z_dir=(-1, 0, 0)), Plane(origin=(-2.571682988, 0, 28), x_dir=(0, -0.02749587661058639, -0.9996219169112968), z_dir=(1, 0, 0))) as chanfrein2_piece_5:
        with BuildLine():
            Line((1.028673195, 0), (-0.056547155, 1.027117794))
            Line((-0.056547155, 1.027117794), (-0.076539593, 1.026567876))
            ThreePointArc((-0.076539593, 1.026567876), (-0.034129227, 0.51339783), (-0.019992438, -0.000549918))
            Line((-0.019992438, -0.000549918), (0.000549918, -0.019992438))
            ThreePointArc((0.000549918, -0.019992438), (0.514497665, -0.00585565), (1.029223113, -0.019992438))
            Line((1.029223113, -0.019992438), (1.028673195, 0))
        make_face()
    extrude(amount=132.903365976, mode=Mode.SUBTRACT)
    with BuildSketch(Plane(origin=(127.76, -2.571682988, 0), x_dir=(0.027495876610582174, 0, 0.9996219169112968), z_dir=(0, 1, 0)), Plane(origin=(0, 88.051682988, 0), x_dir=(-0.027495876610586372, 0, 0.9996219169112968), z_dir=(0, -1, 0))) as chanfrein2_piece_6:
        with BuildLine():
            Line((1.028673195, 0), (-0.056547155, -1.027117794))
            Line((-0.056547155, -1.027117794), (-0.076539593, -1.026567876))
            ThreePointArc((-0.076539593, -1.026567876), (-0.034129227, -0.51339783), (-0.019992438, 0.000549918))
            Line((-0.019992438, 0.000549918), (0.000549918, 0.019992438))
            ThreePointArc((0.000549918, 0.019992438), (0.514497665, 0.00585565), (1.029223113, 0.019992438))
            Line((1.029223113, 0.019992438), (1.028673195, 0))
        make_face()
    extrude(amount=90.623365976, mode=Mode.SUBTRACT)
    with BuildSketch(Plane(origin=(0, 85.48, -2.571682988), x_dir=(-0.027495876610586483, -0.9996219169112968, 0), z_dir=(0, 0, 1)), Plane(origin=(0, 0, -2.571682988), x_dir=(0.9996219169112968, -0.027495876610586372, 0), z_dir=(0, 0, 1))) as chanfrein2_piece_7:
        with BuildLine():
            Line((1.028673195, 0), (-0.056547155, 1.027117794))
            Line((-0.056547155, 1.027117794), (-0.076539593, 1.026567876))
            ThreePointArc((-0.076539593, 1.026567876), (-0.034129227, 0.51339783), (-0.019992438, -0.000549918))
            Line((-0.019992438, -0.000549918), (0.000549918, -0.019992438))
            ThreePointArc((0.000549918, -0.019992438), (0.514497665, -0.00585565), (1.029223113, -0.019992438))
            Line((1.029223113, -0.019992438), (1.028673195, 0))
        make_face()
    extrude(amount=33.143365976, mode=Mode.SUBTRACT)
    with BuildSketch(Plane(origin=(127.76, 85.48, -2.571682988), x_dir=(0.02749587661058229, -0.9996219169112968, 0), z_dir=(0, 0, 1)), Plane(origin=(127.76, 0, -2.571682988), x_dir=(-0.9996219169112968, -0.027495876610586483, 0), z_dir=(0, 0, 1))) as chanfrein2_piece_8:
        with BuildLine():
            Line((1.028673195, 0), (-0.056547155, -1.027117794))
            Line((-0.056547155, -1.027117794), (-0.076539593, -1.026567876))
            ThreePointArc((-0.076539593, -1.026567876), (-0.034129227, -0.51339783), (-0.019992438, 0.000549918))
            Line((-0.019992438, 0.000549918), (0.000549918, 0.019992438))
            ThreePointArc((0.000549918, 0.019992438), (0.514497665, 0.00585565), (1.029223113, 0.019992438))
            Line((1.029223113, 0.019992438), (1.028673195, 0))
        make_face()
    extrude(amount=33.143365976, mode=Mode.SUBTRACT)


solid = part.part
